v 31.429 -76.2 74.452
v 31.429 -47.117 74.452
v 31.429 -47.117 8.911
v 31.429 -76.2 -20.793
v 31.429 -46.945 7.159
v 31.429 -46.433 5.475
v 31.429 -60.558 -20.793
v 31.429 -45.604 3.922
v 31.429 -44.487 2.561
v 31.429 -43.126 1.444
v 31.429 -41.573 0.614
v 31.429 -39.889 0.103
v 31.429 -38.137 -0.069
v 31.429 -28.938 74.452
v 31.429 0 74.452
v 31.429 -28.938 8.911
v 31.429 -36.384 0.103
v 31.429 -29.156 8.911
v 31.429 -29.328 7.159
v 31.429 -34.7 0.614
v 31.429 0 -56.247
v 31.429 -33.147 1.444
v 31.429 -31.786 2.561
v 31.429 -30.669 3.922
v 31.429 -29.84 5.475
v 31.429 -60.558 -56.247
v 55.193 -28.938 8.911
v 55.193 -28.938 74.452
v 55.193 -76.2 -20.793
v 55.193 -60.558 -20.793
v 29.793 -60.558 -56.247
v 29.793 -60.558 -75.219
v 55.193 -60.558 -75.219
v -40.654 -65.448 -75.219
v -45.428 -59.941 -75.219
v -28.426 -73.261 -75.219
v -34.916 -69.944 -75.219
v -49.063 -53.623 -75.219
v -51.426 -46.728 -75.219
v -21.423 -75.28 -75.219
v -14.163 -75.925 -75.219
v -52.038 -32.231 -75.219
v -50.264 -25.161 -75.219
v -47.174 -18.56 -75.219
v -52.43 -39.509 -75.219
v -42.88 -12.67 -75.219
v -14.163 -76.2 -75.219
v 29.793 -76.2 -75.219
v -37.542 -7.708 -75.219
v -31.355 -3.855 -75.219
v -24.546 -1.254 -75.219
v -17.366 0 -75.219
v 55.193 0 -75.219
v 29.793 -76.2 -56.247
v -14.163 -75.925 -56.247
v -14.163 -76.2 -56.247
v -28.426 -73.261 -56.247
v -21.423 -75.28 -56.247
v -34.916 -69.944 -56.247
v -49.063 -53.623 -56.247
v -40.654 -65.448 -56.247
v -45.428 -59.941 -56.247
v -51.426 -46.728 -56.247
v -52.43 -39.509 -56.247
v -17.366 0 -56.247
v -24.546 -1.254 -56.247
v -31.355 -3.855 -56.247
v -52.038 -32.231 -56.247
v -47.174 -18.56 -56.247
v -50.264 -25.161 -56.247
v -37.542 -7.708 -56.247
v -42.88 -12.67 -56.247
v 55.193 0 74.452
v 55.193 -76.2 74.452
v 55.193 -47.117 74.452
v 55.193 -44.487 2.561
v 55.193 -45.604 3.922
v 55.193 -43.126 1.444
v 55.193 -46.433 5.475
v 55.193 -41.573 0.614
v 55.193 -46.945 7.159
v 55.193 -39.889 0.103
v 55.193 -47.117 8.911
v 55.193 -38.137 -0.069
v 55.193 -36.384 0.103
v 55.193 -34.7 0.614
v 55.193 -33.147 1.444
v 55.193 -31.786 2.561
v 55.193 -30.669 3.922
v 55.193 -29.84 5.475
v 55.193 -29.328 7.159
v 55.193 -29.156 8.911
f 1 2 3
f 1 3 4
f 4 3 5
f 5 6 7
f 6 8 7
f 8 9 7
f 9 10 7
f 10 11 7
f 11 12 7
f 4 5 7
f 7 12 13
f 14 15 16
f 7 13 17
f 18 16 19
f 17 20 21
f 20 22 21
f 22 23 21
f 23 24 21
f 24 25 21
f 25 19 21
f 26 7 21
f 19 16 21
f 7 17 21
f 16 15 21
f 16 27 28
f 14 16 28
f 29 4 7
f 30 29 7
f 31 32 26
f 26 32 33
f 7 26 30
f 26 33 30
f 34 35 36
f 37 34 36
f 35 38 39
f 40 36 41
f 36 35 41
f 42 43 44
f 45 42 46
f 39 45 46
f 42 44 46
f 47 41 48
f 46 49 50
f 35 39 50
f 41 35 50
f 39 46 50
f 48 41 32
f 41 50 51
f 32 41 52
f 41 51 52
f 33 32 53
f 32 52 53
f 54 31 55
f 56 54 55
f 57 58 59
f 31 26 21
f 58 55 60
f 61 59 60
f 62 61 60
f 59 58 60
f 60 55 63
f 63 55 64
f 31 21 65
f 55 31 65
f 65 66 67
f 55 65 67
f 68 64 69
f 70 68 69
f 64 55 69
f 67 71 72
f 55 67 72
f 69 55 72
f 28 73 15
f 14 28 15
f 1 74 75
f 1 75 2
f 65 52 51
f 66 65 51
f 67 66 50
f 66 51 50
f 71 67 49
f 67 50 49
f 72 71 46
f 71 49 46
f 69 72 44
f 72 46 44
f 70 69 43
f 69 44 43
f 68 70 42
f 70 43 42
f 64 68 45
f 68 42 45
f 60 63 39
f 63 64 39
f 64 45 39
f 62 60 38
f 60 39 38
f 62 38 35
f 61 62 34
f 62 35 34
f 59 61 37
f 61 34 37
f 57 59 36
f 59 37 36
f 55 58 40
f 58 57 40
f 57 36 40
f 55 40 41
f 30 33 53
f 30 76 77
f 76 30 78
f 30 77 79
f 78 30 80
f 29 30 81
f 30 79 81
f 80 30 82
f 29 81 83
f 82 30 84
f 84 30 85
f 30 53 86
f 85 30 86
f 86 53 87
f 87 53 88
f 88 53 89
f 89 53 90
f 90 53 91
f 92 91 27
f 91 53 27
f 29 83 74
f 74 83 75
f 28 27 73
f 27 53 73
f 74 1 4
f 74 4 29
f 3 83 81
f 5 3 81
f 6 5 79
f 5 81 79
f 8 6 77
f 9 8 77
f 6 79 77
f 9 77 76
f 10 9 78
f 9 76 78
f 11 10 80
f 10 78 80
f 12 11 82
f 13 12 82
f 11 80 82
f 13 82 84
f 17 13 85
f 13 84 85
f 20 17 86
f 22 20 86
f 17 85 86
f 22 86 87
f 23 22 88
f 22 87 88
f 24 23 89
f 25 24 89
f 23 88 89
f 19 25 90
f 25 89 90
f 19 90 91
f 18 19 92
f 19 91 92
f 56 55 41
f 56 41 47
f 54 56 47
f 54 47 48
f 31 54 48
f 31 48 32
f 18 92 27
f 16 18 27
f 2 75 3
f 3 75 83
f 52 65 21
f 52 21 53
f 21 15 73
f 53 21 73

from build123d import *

# Parameters (mm, degrees)
F1_DEPTH = 76.2
F3_DEPTH = 107.7030838857
F5_W     = 15.6415318966
F5_H     = 54.425964132
F6_DEPTH = 25.4
F8_DEPTH = 149.6723981032


# Not quite as in the source:
# - a feature of the source that left no trace in its solid (it failed there, or was rolled back) is left out


with BuildPart() as f1:
    # F0 (on Front) → F1 (new body)
    with BuildSketch(Plane.XZ):
        Polygon((55.1925264299, 74.4524151087), (31.4290784299, 74.4524151087), (31.4290784299, -56.2465488911), (-52.5095574558, -56.2465488911), (-52.5095574558, -75.2189829946), (55.1925264299, -75.2189829946), align=None)
    extrude(amount=F1_DEPTH)

    # F2 (on face) → F3 (cut, through all)
    with BuildSketch(Plane.YZ.offset(55.1925264299)):
        with BuildLine():
            Line((-47.1170713552, 8.9112932328), (-29.1559303752, 8.9112932328))
            ThreePointArc((-29.1559303752, 8.9112932328), (-38.1365008652, 17.8918637228), (-47.1170713552, 8.9112932328))
        make_face()
        with BuildLine():
            ThreePointArc((-47.1170713552, 8.9112932328), (-38.1365008652, -0.0692772572), (-29.1559303752, 8.9112932328))
            Line((-29.1559303752, 8.9112932328), (-47.1170713552, 8.9112932328))
        make_face()
        with BuildLine():
            ThreePointArc((-47.1170713552, 8.9112932328), (-38.1365008652, 17.8918637228), (-29.1559303752, 8.9112932328))
            Line((-29.1559303752, 8.9112932328), (-28.9377495646, 8.9112932328))
            Line((-28.9377495646, 8.9112932328), (-28.9377495646, 74.4524151087))
            Line((-28.9377495646, 74.4524151087), (-47.1170713552, 74.4524151087))
            Line((-47.1170713552, 74.4524151087), (-47.1170713552, 8.9112932328))
        make_face()
    extrude(amount=-F3_DEPTH, mode=Mode.SUBTRACT)

    # F5 (on face) → F6 (cut)
    with BuildSketch(Plane.YZ.offset(55.1925264299)):
        with Locations((-68.3792340517, -48.0060009286)):
            Rectangle(F5_W, F5_H)
    extrude(amount=-F6_DEPTH, mode=Mode.SUBTRACT)

    # F7 (on face) → F8 (cut, through all)
    with BuildSketch(Plane(origin=(0, 0, -75.2189829946), x_dir=(1, 0, 0), z_dir=(0, 0, -1))):
        with BuildLine():
            ThreePointArc((-17.3657385867, 0), (-52.4302228968, 39.5091264656), (-14.1626540173, 75.9245394945))
            Line((-14.1626540173, 75.9245394945), (-14.1626540173, 76.2))
            Line((-14.1626540173, 76.2), (-52.5095574558, 76.2))
            Line((-52.5095574558, 76.2), (-52.5095574558, 0))
            Line((-52.5095574558, 0), (-17.3657385867, 0))
        make_face()
    extrude(amount=-F8_DEPTH, mode=Mode.SUBTRACT)


solid = f1.part
